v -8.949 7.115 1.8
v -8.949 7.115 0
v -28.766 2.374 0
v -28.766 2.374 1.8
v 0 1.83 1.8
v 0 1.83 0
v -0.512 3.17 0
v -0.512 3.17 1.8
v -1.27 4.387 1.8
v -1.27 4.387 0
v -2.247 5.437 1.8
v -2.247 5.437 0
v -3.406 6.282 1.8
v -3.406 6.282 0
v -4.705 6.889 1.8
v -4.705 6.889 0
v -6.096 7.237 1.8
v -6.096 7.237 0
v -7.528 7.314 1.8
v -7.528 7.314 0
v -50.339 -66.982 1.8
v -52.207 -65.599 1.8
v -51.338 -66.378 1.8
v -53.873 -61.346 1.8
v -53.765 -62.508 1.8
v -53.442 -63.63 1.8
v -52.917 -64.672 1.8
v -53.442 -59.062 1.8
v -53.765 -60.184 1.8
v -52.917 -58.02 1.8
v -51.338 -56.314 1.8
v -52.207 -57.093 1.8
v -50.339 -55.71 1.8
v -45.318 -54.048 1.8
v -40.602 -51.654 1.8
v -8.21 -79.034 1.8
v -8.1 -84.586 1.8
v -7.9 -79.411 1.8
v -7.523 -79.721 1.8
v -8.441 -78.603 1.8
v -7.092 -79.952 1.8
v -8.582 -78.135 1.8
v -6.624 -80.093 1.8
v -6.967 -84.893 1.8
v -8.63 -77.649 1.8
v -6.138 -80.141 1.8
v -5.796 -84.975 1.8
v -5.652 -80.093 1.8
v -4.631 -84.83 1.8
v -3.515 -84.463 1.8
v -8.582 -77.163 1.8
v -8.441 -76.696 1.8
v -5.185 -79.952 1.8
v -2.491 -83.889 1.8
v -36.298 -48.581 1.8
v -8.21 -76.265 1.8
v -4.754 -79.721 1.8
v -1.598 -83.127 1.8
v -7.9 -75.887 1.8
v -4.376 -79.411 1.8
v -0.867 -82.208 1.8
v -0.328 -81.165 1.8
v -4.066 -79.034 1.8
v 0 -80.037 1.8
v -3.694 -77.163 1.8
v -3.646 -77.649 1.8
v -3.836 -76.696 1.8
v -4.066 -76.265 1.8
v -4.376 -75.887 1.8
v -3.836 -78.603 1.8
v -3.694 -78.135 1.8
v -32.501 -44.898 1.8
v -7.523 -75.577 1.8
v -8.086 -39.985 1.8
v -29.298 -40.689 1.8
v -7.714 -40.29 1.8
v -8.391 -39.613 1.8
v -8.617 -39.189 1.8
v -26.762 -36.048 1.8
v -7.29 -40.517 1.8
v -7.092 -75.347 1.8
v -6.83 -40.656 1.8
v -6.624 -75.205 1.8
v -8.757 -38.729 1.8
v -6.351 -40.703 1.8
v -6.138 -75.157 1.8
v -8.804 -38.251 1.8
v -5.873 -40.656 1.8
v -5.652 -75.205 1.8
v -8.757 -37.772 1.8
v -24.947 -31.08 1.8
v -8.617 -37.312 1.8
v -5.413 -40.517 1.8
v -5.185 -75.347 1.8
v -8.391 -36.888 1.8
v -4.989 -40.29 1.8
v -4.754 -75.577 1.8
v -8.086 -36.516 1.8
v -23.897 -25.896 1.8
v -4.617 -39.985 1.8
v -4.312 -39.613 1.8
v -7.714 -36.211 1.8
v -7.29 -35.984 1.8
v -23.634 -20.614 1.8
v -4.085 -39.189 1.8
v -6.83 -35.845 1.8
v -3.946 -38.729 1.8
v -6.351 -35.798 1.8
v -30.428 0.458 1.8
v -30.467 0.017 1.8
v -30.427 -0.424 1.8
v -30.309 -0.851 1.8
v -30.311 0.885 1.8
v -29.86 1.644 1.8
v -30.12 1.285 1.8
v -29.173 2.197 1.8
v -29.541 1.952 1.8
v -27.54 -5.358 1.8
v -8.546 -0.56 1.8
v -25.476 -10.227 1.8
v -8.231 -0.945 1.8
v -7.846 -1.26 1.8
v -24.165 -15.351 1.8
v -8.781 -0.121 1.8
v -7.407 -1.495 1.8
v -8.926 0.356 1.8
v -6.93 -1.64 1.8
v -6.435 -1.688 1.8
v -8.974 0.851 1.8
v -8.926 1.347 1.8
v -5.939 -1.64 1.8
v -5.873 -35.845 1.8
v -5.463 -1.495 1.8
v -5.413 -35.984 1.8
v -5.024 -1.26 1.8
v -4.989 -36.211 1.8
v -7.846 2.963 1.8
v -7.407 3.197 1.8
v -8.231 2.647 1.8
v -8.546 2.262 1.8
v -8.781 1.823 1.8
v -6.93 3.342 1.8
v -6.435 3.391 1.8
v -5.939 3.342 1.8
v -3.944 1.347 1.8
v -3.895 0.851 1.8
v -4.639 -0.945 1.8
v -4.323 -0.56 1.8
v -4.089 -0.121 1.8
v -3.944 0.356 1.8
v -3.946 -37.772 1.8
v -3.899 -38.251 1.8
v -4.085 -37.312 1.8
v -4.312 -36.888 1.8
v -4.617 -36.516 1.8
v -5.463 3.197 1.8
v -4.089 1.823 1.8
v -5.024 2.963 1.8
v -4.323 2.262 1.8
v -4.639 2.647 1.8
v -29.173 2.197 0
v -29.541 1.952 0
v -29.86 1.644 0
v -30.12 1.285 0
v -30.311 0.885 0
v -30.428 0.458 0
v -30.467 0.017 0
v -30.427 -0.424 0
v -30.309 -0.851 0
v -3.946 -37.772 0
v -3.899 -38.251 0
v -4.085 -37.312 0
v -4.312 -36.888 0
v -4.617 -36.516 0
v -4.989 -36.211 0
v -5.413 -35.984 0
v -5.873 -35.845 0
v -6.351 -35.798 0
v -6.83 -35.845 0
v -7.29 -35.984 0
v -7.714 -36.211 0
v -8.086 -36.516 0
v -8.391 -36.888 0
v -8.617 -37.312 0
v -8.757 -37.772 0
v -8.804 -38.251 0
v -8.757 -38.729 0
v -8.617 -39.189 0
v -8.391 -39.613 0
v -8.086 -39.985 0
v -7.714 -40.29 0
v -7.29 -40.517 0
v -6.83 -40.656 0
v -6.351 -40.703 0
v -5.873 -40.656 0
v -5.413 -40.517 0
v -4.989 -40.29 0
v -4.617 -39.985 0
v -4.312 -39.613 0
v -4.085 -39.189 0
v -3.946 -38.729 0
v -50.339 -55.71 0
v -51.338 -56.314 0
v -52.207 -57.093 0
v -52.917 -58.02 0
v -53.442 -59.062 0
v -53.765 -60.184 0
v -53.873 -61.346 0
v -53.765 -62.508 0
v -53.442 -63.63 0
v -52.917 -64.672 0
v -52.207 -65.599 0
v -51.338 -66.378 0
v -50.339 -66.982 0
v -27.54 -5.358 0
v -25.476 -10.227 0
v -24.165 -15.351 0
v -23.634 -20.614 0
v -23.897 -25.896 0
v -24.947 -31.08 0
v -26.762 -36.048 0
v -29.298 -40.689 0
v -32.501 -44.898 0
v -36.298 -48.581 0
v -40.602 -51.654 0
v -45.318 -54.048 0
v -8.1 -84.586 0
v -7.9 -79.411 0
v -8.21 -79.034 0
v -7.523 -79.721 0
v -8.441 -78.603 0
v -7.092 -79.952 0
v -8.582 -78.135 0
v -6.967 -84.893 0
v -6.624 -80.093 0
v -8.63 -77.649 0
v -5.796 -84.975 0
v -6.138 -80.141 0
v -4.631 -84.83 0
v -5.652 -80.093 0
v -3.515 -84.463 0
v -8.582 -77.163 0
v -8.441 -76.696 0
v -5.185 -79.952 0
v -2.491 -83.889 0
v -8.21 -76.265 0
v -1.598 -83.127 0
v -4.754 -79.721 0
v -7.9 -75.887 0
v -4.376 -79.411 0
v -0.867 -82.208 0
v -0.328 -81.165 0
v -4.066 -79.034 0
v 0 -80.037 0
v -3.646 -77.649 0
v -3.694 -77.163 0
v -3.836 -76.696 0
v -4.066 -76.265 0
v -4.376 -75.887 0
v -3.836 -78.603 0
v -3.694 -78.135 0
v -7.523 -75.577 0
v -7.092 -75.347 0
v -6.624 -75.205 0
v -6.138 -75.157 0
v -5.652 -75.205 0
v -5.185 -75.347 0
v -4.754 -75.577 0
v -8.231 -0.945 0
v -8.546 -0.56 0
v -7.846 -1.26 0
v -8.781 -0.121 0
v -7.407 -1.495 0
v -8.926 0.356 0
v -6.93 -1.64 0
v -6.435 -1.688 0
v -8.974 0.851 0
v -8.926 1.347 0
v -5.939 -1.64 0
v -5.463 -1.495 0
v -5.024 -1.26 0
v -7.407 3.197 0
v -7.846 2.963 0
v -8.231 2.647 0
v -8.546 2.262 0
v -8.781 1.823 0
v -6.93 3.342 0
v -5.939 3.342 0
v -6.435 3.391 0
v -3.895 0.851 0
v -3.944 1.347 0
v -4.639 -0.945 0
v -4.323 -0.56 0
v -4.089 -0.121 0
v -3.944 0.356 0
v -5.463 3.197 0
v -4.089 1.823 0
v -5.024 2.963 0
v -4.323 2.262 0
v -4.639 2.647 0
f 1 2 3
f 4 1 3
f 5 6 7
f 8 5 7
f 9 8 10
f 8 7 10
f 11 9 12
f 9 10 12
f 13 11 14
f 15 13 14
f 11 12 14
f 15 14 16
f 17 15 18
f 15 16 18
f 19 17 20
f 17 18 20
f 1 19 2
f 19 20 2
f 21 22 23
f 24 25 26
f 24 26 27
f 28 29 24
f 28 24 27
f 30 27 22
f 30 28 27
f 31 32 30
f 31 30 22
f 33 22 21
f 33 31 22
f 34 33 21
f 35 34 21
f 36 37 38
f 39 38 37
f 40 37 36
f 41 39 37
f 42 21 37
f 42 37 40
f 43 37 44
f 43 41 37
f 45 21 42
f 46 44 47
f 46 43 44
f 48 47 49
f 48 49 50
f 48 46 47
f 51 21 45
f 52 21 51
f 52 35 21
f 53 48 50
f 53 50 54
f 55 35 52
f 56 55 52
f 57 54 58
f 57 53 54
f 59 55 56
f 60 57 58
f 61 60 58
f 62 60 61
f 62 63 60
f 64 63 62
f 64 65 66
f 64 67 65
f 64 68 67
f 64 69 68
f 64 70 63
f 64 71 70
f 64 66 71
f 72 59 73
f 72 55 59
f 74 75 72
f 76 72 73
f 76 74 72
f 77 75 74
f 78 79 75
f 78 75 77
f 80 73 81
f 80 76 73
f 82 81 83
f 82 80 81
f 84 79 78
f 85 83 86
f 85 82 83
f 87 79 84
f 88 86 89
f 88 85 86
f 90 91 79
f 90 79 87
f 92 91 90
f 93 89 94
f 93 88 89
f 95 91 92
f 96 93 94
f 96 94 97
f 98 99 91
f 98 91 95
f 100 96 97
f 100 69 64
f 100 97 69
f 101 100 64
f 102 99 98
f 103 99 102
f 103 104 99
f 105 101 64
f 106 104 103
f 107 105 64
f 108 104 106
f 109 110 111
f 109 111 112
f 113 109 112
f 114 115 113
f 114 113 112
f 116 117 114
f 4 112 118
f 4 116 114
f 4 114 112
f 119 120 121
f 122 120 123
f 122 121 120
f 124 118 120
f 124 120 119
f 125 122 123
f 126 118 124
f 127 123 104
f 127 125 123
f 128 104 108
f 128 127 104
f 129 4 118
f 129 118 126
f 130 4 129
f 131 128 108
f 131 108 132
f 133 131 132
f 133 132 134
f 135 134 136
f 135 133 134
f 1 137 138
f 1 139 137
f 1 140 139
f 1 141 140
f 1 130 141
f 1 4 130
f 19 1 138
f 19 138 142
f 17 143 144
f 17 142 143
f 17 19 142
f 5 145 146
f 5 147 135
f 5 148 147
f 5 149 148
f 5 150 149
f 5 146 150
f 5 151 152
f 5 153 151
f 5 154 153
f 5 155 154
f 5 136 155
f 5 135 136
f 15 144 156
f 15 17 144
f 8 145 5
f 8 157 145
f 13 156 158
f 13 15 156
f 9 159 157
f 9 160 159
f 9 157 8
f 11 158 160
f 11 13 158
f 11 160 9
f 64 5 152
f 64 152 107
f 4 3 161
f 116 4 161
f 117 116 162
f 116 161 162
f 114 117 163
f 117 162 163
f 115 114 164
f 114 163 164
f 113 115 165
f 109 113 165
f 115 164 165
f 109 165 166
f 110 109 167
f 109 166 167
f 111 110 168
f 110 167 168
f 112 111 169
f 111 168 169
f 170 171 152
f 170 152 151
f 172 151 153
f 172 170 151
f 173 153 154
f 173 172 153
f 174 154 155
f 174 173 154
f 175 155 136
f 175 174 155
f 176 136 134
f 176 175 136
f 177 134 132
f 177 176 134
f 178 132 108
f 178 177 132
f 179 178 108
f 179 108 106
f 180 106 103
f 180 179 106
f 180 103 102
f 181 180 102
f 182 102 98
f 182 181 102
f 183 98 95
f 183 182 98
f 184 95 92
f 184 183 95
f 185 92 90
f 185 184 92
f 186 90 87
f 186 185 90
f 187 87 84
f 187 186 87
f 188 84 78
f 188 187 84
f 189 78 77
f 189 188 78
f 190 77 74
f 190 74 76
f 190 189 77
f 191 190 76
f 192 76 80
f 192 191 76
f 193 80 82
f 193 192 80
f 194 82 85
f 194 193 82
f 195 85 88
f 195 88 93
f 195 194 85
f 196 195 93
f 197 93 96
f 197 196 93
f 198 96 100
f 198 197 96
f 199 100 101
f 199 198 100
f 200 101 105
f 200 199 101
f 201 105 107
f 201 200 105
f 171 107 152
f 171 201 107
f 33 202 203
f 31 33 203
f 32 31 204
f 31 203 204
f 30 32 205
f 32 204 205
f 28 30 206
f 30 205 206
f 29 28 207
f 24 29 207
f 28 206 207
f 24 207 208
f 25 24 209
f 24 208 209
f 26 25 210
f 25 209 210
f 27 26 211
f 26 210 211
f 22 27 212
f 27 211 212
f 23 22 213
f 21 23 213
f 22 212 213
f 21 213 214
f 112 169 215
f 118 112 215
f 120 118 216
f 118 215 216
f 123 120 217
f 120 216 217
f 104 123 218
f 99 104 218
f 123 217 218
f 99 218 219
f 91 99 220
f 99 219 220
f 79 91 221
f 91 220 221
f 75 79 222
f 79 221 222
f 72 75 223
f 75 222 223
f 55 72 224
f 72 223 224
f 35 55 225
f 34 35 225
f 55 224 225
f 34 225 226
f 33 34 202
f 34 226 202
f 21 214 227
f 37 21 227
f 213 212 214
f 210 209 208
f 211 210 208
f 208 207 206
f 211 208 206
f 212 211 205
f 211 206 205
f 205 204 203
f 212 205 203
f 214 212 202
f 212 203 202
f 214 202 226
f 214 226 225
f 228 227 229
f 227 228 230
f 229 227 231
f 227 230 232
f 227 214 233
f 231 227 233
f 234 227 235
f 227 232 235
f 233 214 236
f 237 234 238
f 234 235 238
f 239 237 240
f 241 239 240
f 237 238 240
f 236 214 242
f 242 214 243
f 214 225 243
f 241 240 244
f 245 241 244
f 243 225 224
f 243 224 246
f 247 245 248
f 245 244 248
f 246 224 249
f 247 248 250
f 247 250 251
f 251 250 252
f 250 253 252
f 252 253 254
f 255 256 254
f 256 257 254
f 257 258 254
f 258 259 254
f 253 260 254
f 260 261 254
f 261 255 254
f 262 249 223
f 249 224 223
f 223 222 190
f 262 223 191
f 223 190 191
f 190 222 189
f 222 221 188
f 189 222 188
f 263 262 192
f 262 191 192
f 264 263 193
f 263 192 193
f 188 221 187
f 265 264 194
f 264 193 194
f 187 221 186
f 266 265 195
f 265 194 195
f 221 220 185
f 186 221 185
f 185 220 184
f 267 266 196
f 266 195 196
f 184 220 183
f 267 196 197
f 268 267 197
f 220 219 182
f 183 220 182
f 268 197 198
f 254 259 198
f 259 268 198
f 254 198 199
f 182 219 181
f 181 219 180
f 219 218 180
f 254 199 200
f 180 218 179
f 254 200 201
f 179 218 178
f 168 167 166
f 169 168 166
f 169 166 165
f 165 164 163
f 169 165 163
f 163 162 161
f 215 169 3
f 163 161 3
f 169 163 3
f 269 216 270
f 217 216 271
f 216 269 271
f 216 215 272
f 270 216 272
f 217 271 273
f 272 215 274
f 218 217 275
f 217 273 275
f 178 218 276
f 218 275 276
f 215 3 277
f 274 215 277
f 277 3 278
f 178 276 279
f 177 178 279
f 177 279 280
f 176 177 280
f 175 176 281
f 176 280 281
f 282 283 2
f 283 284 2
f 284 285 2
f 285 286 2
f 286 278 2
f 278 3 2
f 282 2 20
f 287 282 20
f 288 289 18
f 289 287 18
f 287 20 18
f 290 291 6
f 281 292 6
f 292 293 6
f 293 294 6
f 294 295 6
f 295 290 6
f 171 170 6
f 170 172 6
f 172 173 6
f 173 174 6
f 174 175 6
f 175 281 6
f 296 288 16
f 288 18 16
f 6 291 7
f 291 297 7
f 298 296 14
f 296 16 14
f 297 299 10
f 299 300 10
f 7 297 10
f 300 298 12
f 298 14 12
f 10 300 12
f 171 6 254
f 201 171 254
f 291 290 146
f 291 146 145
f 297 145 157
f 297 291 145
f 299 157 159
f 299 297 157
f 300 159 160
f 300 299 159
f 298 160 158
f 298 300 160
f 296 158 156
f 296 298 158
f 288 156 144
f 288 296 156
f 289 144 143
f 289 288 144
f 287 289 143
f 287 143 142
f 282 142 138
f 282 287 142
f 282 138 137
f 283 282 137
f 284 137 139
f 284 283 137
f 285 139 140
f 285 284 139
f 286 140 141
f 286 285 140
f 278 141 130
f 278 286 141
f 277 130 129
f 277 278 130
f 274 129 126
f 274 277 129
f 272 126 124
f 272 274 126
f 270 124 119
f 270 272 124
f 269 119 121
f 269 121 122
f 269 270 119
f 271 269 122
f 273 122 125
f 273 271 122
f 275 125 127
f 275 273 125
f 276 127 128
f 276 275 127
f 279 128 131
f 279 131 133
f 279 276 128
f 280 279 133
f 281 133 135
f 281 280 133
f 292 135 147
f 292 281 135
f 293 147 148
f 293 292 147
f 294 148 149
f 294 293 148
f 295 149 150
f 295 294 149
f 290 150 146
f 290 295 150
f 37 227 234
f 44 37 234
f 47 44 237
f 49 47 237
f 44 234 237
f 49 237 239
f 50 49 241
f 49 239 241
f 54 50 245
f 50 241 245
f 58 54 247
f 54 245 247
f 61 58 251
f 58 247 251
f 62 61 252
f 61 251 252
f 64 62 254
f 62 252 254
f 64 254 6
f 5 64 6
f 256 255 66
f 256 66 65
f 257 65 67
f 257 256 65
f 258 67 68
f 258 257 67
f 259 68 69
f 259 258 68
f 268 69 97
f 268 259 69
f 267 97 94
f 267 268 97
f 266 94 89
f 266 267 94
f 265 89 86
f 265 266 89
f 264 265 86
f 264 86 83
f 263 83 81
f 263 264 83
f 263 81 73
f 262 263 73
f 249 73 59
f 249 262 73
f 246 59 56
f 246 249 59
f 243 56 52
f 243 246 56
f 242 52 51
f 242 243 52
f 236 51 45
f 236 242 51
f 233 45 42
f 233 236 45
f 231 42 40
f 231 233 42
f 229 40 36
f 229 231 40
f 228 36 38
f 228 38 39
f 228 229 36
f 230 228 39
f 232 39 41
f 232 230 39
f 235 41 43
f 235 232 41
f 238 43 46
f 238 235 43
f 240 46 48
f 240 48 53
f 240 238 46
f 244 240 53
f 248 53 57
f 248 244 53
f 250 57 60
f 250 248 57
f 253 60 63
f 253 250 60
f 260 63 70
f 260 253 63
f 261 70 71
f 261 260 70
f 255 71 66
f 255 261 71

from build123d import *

# Parameters (mm, degrees)
F0_R     = 2.492008
F0_R_2   = 2.45277
F0_R_3   = 2.539594
F1_DEPTH = 1.8


with BuildPart() as f1:
    # F0 (on Top) → F1 (new body)
    with BuildSketch(Plane.XY):
        with BuildLine():
            Line((-50.339356, -66.981845), (-8.10042, -84.58598))
            ThreePointArc((-8.10042, -84.58598), (-2.989306, -84.200884), (0, -80.037251))
            Line((0, -80.037251), (0, 1.829881))
            ThreePointArc((0, 1.829881), (-3.406029, 6.28153), (-8.948847, 7.11543))
            Line((-8.948847, 7.11543), (-28.766483, 2.37366))
            ThreePointArc((-28.766483, 2.37366), (-30.224163, 1.08954), (-30.308826, -0.851239))
            ThreePointArc((-30.308826, -0.851239), (-25.761186, -33.597985), (-50.339356, -55.710062))
            ThreePointArc((-50.339356, -55.710062), (-53.87346, -61.345953), (-50.339356, -66.981845))
        make_face()
        with Locations((-6.138234, -77.649219)):
            Circle(F0_R, mode=Mode.SUBTRACT)
        with Locations((-6.351363, -38.250507)):
            Circle(F0_R_2, mode=Mode.SUBTRACT)
        with Locations((-6.43489, 0.851118)):
            Circle(F0_R_3, mode=Mode.SUBTRACT)
    extrude(amount=F1_DEPTH)


solid = f1.part
